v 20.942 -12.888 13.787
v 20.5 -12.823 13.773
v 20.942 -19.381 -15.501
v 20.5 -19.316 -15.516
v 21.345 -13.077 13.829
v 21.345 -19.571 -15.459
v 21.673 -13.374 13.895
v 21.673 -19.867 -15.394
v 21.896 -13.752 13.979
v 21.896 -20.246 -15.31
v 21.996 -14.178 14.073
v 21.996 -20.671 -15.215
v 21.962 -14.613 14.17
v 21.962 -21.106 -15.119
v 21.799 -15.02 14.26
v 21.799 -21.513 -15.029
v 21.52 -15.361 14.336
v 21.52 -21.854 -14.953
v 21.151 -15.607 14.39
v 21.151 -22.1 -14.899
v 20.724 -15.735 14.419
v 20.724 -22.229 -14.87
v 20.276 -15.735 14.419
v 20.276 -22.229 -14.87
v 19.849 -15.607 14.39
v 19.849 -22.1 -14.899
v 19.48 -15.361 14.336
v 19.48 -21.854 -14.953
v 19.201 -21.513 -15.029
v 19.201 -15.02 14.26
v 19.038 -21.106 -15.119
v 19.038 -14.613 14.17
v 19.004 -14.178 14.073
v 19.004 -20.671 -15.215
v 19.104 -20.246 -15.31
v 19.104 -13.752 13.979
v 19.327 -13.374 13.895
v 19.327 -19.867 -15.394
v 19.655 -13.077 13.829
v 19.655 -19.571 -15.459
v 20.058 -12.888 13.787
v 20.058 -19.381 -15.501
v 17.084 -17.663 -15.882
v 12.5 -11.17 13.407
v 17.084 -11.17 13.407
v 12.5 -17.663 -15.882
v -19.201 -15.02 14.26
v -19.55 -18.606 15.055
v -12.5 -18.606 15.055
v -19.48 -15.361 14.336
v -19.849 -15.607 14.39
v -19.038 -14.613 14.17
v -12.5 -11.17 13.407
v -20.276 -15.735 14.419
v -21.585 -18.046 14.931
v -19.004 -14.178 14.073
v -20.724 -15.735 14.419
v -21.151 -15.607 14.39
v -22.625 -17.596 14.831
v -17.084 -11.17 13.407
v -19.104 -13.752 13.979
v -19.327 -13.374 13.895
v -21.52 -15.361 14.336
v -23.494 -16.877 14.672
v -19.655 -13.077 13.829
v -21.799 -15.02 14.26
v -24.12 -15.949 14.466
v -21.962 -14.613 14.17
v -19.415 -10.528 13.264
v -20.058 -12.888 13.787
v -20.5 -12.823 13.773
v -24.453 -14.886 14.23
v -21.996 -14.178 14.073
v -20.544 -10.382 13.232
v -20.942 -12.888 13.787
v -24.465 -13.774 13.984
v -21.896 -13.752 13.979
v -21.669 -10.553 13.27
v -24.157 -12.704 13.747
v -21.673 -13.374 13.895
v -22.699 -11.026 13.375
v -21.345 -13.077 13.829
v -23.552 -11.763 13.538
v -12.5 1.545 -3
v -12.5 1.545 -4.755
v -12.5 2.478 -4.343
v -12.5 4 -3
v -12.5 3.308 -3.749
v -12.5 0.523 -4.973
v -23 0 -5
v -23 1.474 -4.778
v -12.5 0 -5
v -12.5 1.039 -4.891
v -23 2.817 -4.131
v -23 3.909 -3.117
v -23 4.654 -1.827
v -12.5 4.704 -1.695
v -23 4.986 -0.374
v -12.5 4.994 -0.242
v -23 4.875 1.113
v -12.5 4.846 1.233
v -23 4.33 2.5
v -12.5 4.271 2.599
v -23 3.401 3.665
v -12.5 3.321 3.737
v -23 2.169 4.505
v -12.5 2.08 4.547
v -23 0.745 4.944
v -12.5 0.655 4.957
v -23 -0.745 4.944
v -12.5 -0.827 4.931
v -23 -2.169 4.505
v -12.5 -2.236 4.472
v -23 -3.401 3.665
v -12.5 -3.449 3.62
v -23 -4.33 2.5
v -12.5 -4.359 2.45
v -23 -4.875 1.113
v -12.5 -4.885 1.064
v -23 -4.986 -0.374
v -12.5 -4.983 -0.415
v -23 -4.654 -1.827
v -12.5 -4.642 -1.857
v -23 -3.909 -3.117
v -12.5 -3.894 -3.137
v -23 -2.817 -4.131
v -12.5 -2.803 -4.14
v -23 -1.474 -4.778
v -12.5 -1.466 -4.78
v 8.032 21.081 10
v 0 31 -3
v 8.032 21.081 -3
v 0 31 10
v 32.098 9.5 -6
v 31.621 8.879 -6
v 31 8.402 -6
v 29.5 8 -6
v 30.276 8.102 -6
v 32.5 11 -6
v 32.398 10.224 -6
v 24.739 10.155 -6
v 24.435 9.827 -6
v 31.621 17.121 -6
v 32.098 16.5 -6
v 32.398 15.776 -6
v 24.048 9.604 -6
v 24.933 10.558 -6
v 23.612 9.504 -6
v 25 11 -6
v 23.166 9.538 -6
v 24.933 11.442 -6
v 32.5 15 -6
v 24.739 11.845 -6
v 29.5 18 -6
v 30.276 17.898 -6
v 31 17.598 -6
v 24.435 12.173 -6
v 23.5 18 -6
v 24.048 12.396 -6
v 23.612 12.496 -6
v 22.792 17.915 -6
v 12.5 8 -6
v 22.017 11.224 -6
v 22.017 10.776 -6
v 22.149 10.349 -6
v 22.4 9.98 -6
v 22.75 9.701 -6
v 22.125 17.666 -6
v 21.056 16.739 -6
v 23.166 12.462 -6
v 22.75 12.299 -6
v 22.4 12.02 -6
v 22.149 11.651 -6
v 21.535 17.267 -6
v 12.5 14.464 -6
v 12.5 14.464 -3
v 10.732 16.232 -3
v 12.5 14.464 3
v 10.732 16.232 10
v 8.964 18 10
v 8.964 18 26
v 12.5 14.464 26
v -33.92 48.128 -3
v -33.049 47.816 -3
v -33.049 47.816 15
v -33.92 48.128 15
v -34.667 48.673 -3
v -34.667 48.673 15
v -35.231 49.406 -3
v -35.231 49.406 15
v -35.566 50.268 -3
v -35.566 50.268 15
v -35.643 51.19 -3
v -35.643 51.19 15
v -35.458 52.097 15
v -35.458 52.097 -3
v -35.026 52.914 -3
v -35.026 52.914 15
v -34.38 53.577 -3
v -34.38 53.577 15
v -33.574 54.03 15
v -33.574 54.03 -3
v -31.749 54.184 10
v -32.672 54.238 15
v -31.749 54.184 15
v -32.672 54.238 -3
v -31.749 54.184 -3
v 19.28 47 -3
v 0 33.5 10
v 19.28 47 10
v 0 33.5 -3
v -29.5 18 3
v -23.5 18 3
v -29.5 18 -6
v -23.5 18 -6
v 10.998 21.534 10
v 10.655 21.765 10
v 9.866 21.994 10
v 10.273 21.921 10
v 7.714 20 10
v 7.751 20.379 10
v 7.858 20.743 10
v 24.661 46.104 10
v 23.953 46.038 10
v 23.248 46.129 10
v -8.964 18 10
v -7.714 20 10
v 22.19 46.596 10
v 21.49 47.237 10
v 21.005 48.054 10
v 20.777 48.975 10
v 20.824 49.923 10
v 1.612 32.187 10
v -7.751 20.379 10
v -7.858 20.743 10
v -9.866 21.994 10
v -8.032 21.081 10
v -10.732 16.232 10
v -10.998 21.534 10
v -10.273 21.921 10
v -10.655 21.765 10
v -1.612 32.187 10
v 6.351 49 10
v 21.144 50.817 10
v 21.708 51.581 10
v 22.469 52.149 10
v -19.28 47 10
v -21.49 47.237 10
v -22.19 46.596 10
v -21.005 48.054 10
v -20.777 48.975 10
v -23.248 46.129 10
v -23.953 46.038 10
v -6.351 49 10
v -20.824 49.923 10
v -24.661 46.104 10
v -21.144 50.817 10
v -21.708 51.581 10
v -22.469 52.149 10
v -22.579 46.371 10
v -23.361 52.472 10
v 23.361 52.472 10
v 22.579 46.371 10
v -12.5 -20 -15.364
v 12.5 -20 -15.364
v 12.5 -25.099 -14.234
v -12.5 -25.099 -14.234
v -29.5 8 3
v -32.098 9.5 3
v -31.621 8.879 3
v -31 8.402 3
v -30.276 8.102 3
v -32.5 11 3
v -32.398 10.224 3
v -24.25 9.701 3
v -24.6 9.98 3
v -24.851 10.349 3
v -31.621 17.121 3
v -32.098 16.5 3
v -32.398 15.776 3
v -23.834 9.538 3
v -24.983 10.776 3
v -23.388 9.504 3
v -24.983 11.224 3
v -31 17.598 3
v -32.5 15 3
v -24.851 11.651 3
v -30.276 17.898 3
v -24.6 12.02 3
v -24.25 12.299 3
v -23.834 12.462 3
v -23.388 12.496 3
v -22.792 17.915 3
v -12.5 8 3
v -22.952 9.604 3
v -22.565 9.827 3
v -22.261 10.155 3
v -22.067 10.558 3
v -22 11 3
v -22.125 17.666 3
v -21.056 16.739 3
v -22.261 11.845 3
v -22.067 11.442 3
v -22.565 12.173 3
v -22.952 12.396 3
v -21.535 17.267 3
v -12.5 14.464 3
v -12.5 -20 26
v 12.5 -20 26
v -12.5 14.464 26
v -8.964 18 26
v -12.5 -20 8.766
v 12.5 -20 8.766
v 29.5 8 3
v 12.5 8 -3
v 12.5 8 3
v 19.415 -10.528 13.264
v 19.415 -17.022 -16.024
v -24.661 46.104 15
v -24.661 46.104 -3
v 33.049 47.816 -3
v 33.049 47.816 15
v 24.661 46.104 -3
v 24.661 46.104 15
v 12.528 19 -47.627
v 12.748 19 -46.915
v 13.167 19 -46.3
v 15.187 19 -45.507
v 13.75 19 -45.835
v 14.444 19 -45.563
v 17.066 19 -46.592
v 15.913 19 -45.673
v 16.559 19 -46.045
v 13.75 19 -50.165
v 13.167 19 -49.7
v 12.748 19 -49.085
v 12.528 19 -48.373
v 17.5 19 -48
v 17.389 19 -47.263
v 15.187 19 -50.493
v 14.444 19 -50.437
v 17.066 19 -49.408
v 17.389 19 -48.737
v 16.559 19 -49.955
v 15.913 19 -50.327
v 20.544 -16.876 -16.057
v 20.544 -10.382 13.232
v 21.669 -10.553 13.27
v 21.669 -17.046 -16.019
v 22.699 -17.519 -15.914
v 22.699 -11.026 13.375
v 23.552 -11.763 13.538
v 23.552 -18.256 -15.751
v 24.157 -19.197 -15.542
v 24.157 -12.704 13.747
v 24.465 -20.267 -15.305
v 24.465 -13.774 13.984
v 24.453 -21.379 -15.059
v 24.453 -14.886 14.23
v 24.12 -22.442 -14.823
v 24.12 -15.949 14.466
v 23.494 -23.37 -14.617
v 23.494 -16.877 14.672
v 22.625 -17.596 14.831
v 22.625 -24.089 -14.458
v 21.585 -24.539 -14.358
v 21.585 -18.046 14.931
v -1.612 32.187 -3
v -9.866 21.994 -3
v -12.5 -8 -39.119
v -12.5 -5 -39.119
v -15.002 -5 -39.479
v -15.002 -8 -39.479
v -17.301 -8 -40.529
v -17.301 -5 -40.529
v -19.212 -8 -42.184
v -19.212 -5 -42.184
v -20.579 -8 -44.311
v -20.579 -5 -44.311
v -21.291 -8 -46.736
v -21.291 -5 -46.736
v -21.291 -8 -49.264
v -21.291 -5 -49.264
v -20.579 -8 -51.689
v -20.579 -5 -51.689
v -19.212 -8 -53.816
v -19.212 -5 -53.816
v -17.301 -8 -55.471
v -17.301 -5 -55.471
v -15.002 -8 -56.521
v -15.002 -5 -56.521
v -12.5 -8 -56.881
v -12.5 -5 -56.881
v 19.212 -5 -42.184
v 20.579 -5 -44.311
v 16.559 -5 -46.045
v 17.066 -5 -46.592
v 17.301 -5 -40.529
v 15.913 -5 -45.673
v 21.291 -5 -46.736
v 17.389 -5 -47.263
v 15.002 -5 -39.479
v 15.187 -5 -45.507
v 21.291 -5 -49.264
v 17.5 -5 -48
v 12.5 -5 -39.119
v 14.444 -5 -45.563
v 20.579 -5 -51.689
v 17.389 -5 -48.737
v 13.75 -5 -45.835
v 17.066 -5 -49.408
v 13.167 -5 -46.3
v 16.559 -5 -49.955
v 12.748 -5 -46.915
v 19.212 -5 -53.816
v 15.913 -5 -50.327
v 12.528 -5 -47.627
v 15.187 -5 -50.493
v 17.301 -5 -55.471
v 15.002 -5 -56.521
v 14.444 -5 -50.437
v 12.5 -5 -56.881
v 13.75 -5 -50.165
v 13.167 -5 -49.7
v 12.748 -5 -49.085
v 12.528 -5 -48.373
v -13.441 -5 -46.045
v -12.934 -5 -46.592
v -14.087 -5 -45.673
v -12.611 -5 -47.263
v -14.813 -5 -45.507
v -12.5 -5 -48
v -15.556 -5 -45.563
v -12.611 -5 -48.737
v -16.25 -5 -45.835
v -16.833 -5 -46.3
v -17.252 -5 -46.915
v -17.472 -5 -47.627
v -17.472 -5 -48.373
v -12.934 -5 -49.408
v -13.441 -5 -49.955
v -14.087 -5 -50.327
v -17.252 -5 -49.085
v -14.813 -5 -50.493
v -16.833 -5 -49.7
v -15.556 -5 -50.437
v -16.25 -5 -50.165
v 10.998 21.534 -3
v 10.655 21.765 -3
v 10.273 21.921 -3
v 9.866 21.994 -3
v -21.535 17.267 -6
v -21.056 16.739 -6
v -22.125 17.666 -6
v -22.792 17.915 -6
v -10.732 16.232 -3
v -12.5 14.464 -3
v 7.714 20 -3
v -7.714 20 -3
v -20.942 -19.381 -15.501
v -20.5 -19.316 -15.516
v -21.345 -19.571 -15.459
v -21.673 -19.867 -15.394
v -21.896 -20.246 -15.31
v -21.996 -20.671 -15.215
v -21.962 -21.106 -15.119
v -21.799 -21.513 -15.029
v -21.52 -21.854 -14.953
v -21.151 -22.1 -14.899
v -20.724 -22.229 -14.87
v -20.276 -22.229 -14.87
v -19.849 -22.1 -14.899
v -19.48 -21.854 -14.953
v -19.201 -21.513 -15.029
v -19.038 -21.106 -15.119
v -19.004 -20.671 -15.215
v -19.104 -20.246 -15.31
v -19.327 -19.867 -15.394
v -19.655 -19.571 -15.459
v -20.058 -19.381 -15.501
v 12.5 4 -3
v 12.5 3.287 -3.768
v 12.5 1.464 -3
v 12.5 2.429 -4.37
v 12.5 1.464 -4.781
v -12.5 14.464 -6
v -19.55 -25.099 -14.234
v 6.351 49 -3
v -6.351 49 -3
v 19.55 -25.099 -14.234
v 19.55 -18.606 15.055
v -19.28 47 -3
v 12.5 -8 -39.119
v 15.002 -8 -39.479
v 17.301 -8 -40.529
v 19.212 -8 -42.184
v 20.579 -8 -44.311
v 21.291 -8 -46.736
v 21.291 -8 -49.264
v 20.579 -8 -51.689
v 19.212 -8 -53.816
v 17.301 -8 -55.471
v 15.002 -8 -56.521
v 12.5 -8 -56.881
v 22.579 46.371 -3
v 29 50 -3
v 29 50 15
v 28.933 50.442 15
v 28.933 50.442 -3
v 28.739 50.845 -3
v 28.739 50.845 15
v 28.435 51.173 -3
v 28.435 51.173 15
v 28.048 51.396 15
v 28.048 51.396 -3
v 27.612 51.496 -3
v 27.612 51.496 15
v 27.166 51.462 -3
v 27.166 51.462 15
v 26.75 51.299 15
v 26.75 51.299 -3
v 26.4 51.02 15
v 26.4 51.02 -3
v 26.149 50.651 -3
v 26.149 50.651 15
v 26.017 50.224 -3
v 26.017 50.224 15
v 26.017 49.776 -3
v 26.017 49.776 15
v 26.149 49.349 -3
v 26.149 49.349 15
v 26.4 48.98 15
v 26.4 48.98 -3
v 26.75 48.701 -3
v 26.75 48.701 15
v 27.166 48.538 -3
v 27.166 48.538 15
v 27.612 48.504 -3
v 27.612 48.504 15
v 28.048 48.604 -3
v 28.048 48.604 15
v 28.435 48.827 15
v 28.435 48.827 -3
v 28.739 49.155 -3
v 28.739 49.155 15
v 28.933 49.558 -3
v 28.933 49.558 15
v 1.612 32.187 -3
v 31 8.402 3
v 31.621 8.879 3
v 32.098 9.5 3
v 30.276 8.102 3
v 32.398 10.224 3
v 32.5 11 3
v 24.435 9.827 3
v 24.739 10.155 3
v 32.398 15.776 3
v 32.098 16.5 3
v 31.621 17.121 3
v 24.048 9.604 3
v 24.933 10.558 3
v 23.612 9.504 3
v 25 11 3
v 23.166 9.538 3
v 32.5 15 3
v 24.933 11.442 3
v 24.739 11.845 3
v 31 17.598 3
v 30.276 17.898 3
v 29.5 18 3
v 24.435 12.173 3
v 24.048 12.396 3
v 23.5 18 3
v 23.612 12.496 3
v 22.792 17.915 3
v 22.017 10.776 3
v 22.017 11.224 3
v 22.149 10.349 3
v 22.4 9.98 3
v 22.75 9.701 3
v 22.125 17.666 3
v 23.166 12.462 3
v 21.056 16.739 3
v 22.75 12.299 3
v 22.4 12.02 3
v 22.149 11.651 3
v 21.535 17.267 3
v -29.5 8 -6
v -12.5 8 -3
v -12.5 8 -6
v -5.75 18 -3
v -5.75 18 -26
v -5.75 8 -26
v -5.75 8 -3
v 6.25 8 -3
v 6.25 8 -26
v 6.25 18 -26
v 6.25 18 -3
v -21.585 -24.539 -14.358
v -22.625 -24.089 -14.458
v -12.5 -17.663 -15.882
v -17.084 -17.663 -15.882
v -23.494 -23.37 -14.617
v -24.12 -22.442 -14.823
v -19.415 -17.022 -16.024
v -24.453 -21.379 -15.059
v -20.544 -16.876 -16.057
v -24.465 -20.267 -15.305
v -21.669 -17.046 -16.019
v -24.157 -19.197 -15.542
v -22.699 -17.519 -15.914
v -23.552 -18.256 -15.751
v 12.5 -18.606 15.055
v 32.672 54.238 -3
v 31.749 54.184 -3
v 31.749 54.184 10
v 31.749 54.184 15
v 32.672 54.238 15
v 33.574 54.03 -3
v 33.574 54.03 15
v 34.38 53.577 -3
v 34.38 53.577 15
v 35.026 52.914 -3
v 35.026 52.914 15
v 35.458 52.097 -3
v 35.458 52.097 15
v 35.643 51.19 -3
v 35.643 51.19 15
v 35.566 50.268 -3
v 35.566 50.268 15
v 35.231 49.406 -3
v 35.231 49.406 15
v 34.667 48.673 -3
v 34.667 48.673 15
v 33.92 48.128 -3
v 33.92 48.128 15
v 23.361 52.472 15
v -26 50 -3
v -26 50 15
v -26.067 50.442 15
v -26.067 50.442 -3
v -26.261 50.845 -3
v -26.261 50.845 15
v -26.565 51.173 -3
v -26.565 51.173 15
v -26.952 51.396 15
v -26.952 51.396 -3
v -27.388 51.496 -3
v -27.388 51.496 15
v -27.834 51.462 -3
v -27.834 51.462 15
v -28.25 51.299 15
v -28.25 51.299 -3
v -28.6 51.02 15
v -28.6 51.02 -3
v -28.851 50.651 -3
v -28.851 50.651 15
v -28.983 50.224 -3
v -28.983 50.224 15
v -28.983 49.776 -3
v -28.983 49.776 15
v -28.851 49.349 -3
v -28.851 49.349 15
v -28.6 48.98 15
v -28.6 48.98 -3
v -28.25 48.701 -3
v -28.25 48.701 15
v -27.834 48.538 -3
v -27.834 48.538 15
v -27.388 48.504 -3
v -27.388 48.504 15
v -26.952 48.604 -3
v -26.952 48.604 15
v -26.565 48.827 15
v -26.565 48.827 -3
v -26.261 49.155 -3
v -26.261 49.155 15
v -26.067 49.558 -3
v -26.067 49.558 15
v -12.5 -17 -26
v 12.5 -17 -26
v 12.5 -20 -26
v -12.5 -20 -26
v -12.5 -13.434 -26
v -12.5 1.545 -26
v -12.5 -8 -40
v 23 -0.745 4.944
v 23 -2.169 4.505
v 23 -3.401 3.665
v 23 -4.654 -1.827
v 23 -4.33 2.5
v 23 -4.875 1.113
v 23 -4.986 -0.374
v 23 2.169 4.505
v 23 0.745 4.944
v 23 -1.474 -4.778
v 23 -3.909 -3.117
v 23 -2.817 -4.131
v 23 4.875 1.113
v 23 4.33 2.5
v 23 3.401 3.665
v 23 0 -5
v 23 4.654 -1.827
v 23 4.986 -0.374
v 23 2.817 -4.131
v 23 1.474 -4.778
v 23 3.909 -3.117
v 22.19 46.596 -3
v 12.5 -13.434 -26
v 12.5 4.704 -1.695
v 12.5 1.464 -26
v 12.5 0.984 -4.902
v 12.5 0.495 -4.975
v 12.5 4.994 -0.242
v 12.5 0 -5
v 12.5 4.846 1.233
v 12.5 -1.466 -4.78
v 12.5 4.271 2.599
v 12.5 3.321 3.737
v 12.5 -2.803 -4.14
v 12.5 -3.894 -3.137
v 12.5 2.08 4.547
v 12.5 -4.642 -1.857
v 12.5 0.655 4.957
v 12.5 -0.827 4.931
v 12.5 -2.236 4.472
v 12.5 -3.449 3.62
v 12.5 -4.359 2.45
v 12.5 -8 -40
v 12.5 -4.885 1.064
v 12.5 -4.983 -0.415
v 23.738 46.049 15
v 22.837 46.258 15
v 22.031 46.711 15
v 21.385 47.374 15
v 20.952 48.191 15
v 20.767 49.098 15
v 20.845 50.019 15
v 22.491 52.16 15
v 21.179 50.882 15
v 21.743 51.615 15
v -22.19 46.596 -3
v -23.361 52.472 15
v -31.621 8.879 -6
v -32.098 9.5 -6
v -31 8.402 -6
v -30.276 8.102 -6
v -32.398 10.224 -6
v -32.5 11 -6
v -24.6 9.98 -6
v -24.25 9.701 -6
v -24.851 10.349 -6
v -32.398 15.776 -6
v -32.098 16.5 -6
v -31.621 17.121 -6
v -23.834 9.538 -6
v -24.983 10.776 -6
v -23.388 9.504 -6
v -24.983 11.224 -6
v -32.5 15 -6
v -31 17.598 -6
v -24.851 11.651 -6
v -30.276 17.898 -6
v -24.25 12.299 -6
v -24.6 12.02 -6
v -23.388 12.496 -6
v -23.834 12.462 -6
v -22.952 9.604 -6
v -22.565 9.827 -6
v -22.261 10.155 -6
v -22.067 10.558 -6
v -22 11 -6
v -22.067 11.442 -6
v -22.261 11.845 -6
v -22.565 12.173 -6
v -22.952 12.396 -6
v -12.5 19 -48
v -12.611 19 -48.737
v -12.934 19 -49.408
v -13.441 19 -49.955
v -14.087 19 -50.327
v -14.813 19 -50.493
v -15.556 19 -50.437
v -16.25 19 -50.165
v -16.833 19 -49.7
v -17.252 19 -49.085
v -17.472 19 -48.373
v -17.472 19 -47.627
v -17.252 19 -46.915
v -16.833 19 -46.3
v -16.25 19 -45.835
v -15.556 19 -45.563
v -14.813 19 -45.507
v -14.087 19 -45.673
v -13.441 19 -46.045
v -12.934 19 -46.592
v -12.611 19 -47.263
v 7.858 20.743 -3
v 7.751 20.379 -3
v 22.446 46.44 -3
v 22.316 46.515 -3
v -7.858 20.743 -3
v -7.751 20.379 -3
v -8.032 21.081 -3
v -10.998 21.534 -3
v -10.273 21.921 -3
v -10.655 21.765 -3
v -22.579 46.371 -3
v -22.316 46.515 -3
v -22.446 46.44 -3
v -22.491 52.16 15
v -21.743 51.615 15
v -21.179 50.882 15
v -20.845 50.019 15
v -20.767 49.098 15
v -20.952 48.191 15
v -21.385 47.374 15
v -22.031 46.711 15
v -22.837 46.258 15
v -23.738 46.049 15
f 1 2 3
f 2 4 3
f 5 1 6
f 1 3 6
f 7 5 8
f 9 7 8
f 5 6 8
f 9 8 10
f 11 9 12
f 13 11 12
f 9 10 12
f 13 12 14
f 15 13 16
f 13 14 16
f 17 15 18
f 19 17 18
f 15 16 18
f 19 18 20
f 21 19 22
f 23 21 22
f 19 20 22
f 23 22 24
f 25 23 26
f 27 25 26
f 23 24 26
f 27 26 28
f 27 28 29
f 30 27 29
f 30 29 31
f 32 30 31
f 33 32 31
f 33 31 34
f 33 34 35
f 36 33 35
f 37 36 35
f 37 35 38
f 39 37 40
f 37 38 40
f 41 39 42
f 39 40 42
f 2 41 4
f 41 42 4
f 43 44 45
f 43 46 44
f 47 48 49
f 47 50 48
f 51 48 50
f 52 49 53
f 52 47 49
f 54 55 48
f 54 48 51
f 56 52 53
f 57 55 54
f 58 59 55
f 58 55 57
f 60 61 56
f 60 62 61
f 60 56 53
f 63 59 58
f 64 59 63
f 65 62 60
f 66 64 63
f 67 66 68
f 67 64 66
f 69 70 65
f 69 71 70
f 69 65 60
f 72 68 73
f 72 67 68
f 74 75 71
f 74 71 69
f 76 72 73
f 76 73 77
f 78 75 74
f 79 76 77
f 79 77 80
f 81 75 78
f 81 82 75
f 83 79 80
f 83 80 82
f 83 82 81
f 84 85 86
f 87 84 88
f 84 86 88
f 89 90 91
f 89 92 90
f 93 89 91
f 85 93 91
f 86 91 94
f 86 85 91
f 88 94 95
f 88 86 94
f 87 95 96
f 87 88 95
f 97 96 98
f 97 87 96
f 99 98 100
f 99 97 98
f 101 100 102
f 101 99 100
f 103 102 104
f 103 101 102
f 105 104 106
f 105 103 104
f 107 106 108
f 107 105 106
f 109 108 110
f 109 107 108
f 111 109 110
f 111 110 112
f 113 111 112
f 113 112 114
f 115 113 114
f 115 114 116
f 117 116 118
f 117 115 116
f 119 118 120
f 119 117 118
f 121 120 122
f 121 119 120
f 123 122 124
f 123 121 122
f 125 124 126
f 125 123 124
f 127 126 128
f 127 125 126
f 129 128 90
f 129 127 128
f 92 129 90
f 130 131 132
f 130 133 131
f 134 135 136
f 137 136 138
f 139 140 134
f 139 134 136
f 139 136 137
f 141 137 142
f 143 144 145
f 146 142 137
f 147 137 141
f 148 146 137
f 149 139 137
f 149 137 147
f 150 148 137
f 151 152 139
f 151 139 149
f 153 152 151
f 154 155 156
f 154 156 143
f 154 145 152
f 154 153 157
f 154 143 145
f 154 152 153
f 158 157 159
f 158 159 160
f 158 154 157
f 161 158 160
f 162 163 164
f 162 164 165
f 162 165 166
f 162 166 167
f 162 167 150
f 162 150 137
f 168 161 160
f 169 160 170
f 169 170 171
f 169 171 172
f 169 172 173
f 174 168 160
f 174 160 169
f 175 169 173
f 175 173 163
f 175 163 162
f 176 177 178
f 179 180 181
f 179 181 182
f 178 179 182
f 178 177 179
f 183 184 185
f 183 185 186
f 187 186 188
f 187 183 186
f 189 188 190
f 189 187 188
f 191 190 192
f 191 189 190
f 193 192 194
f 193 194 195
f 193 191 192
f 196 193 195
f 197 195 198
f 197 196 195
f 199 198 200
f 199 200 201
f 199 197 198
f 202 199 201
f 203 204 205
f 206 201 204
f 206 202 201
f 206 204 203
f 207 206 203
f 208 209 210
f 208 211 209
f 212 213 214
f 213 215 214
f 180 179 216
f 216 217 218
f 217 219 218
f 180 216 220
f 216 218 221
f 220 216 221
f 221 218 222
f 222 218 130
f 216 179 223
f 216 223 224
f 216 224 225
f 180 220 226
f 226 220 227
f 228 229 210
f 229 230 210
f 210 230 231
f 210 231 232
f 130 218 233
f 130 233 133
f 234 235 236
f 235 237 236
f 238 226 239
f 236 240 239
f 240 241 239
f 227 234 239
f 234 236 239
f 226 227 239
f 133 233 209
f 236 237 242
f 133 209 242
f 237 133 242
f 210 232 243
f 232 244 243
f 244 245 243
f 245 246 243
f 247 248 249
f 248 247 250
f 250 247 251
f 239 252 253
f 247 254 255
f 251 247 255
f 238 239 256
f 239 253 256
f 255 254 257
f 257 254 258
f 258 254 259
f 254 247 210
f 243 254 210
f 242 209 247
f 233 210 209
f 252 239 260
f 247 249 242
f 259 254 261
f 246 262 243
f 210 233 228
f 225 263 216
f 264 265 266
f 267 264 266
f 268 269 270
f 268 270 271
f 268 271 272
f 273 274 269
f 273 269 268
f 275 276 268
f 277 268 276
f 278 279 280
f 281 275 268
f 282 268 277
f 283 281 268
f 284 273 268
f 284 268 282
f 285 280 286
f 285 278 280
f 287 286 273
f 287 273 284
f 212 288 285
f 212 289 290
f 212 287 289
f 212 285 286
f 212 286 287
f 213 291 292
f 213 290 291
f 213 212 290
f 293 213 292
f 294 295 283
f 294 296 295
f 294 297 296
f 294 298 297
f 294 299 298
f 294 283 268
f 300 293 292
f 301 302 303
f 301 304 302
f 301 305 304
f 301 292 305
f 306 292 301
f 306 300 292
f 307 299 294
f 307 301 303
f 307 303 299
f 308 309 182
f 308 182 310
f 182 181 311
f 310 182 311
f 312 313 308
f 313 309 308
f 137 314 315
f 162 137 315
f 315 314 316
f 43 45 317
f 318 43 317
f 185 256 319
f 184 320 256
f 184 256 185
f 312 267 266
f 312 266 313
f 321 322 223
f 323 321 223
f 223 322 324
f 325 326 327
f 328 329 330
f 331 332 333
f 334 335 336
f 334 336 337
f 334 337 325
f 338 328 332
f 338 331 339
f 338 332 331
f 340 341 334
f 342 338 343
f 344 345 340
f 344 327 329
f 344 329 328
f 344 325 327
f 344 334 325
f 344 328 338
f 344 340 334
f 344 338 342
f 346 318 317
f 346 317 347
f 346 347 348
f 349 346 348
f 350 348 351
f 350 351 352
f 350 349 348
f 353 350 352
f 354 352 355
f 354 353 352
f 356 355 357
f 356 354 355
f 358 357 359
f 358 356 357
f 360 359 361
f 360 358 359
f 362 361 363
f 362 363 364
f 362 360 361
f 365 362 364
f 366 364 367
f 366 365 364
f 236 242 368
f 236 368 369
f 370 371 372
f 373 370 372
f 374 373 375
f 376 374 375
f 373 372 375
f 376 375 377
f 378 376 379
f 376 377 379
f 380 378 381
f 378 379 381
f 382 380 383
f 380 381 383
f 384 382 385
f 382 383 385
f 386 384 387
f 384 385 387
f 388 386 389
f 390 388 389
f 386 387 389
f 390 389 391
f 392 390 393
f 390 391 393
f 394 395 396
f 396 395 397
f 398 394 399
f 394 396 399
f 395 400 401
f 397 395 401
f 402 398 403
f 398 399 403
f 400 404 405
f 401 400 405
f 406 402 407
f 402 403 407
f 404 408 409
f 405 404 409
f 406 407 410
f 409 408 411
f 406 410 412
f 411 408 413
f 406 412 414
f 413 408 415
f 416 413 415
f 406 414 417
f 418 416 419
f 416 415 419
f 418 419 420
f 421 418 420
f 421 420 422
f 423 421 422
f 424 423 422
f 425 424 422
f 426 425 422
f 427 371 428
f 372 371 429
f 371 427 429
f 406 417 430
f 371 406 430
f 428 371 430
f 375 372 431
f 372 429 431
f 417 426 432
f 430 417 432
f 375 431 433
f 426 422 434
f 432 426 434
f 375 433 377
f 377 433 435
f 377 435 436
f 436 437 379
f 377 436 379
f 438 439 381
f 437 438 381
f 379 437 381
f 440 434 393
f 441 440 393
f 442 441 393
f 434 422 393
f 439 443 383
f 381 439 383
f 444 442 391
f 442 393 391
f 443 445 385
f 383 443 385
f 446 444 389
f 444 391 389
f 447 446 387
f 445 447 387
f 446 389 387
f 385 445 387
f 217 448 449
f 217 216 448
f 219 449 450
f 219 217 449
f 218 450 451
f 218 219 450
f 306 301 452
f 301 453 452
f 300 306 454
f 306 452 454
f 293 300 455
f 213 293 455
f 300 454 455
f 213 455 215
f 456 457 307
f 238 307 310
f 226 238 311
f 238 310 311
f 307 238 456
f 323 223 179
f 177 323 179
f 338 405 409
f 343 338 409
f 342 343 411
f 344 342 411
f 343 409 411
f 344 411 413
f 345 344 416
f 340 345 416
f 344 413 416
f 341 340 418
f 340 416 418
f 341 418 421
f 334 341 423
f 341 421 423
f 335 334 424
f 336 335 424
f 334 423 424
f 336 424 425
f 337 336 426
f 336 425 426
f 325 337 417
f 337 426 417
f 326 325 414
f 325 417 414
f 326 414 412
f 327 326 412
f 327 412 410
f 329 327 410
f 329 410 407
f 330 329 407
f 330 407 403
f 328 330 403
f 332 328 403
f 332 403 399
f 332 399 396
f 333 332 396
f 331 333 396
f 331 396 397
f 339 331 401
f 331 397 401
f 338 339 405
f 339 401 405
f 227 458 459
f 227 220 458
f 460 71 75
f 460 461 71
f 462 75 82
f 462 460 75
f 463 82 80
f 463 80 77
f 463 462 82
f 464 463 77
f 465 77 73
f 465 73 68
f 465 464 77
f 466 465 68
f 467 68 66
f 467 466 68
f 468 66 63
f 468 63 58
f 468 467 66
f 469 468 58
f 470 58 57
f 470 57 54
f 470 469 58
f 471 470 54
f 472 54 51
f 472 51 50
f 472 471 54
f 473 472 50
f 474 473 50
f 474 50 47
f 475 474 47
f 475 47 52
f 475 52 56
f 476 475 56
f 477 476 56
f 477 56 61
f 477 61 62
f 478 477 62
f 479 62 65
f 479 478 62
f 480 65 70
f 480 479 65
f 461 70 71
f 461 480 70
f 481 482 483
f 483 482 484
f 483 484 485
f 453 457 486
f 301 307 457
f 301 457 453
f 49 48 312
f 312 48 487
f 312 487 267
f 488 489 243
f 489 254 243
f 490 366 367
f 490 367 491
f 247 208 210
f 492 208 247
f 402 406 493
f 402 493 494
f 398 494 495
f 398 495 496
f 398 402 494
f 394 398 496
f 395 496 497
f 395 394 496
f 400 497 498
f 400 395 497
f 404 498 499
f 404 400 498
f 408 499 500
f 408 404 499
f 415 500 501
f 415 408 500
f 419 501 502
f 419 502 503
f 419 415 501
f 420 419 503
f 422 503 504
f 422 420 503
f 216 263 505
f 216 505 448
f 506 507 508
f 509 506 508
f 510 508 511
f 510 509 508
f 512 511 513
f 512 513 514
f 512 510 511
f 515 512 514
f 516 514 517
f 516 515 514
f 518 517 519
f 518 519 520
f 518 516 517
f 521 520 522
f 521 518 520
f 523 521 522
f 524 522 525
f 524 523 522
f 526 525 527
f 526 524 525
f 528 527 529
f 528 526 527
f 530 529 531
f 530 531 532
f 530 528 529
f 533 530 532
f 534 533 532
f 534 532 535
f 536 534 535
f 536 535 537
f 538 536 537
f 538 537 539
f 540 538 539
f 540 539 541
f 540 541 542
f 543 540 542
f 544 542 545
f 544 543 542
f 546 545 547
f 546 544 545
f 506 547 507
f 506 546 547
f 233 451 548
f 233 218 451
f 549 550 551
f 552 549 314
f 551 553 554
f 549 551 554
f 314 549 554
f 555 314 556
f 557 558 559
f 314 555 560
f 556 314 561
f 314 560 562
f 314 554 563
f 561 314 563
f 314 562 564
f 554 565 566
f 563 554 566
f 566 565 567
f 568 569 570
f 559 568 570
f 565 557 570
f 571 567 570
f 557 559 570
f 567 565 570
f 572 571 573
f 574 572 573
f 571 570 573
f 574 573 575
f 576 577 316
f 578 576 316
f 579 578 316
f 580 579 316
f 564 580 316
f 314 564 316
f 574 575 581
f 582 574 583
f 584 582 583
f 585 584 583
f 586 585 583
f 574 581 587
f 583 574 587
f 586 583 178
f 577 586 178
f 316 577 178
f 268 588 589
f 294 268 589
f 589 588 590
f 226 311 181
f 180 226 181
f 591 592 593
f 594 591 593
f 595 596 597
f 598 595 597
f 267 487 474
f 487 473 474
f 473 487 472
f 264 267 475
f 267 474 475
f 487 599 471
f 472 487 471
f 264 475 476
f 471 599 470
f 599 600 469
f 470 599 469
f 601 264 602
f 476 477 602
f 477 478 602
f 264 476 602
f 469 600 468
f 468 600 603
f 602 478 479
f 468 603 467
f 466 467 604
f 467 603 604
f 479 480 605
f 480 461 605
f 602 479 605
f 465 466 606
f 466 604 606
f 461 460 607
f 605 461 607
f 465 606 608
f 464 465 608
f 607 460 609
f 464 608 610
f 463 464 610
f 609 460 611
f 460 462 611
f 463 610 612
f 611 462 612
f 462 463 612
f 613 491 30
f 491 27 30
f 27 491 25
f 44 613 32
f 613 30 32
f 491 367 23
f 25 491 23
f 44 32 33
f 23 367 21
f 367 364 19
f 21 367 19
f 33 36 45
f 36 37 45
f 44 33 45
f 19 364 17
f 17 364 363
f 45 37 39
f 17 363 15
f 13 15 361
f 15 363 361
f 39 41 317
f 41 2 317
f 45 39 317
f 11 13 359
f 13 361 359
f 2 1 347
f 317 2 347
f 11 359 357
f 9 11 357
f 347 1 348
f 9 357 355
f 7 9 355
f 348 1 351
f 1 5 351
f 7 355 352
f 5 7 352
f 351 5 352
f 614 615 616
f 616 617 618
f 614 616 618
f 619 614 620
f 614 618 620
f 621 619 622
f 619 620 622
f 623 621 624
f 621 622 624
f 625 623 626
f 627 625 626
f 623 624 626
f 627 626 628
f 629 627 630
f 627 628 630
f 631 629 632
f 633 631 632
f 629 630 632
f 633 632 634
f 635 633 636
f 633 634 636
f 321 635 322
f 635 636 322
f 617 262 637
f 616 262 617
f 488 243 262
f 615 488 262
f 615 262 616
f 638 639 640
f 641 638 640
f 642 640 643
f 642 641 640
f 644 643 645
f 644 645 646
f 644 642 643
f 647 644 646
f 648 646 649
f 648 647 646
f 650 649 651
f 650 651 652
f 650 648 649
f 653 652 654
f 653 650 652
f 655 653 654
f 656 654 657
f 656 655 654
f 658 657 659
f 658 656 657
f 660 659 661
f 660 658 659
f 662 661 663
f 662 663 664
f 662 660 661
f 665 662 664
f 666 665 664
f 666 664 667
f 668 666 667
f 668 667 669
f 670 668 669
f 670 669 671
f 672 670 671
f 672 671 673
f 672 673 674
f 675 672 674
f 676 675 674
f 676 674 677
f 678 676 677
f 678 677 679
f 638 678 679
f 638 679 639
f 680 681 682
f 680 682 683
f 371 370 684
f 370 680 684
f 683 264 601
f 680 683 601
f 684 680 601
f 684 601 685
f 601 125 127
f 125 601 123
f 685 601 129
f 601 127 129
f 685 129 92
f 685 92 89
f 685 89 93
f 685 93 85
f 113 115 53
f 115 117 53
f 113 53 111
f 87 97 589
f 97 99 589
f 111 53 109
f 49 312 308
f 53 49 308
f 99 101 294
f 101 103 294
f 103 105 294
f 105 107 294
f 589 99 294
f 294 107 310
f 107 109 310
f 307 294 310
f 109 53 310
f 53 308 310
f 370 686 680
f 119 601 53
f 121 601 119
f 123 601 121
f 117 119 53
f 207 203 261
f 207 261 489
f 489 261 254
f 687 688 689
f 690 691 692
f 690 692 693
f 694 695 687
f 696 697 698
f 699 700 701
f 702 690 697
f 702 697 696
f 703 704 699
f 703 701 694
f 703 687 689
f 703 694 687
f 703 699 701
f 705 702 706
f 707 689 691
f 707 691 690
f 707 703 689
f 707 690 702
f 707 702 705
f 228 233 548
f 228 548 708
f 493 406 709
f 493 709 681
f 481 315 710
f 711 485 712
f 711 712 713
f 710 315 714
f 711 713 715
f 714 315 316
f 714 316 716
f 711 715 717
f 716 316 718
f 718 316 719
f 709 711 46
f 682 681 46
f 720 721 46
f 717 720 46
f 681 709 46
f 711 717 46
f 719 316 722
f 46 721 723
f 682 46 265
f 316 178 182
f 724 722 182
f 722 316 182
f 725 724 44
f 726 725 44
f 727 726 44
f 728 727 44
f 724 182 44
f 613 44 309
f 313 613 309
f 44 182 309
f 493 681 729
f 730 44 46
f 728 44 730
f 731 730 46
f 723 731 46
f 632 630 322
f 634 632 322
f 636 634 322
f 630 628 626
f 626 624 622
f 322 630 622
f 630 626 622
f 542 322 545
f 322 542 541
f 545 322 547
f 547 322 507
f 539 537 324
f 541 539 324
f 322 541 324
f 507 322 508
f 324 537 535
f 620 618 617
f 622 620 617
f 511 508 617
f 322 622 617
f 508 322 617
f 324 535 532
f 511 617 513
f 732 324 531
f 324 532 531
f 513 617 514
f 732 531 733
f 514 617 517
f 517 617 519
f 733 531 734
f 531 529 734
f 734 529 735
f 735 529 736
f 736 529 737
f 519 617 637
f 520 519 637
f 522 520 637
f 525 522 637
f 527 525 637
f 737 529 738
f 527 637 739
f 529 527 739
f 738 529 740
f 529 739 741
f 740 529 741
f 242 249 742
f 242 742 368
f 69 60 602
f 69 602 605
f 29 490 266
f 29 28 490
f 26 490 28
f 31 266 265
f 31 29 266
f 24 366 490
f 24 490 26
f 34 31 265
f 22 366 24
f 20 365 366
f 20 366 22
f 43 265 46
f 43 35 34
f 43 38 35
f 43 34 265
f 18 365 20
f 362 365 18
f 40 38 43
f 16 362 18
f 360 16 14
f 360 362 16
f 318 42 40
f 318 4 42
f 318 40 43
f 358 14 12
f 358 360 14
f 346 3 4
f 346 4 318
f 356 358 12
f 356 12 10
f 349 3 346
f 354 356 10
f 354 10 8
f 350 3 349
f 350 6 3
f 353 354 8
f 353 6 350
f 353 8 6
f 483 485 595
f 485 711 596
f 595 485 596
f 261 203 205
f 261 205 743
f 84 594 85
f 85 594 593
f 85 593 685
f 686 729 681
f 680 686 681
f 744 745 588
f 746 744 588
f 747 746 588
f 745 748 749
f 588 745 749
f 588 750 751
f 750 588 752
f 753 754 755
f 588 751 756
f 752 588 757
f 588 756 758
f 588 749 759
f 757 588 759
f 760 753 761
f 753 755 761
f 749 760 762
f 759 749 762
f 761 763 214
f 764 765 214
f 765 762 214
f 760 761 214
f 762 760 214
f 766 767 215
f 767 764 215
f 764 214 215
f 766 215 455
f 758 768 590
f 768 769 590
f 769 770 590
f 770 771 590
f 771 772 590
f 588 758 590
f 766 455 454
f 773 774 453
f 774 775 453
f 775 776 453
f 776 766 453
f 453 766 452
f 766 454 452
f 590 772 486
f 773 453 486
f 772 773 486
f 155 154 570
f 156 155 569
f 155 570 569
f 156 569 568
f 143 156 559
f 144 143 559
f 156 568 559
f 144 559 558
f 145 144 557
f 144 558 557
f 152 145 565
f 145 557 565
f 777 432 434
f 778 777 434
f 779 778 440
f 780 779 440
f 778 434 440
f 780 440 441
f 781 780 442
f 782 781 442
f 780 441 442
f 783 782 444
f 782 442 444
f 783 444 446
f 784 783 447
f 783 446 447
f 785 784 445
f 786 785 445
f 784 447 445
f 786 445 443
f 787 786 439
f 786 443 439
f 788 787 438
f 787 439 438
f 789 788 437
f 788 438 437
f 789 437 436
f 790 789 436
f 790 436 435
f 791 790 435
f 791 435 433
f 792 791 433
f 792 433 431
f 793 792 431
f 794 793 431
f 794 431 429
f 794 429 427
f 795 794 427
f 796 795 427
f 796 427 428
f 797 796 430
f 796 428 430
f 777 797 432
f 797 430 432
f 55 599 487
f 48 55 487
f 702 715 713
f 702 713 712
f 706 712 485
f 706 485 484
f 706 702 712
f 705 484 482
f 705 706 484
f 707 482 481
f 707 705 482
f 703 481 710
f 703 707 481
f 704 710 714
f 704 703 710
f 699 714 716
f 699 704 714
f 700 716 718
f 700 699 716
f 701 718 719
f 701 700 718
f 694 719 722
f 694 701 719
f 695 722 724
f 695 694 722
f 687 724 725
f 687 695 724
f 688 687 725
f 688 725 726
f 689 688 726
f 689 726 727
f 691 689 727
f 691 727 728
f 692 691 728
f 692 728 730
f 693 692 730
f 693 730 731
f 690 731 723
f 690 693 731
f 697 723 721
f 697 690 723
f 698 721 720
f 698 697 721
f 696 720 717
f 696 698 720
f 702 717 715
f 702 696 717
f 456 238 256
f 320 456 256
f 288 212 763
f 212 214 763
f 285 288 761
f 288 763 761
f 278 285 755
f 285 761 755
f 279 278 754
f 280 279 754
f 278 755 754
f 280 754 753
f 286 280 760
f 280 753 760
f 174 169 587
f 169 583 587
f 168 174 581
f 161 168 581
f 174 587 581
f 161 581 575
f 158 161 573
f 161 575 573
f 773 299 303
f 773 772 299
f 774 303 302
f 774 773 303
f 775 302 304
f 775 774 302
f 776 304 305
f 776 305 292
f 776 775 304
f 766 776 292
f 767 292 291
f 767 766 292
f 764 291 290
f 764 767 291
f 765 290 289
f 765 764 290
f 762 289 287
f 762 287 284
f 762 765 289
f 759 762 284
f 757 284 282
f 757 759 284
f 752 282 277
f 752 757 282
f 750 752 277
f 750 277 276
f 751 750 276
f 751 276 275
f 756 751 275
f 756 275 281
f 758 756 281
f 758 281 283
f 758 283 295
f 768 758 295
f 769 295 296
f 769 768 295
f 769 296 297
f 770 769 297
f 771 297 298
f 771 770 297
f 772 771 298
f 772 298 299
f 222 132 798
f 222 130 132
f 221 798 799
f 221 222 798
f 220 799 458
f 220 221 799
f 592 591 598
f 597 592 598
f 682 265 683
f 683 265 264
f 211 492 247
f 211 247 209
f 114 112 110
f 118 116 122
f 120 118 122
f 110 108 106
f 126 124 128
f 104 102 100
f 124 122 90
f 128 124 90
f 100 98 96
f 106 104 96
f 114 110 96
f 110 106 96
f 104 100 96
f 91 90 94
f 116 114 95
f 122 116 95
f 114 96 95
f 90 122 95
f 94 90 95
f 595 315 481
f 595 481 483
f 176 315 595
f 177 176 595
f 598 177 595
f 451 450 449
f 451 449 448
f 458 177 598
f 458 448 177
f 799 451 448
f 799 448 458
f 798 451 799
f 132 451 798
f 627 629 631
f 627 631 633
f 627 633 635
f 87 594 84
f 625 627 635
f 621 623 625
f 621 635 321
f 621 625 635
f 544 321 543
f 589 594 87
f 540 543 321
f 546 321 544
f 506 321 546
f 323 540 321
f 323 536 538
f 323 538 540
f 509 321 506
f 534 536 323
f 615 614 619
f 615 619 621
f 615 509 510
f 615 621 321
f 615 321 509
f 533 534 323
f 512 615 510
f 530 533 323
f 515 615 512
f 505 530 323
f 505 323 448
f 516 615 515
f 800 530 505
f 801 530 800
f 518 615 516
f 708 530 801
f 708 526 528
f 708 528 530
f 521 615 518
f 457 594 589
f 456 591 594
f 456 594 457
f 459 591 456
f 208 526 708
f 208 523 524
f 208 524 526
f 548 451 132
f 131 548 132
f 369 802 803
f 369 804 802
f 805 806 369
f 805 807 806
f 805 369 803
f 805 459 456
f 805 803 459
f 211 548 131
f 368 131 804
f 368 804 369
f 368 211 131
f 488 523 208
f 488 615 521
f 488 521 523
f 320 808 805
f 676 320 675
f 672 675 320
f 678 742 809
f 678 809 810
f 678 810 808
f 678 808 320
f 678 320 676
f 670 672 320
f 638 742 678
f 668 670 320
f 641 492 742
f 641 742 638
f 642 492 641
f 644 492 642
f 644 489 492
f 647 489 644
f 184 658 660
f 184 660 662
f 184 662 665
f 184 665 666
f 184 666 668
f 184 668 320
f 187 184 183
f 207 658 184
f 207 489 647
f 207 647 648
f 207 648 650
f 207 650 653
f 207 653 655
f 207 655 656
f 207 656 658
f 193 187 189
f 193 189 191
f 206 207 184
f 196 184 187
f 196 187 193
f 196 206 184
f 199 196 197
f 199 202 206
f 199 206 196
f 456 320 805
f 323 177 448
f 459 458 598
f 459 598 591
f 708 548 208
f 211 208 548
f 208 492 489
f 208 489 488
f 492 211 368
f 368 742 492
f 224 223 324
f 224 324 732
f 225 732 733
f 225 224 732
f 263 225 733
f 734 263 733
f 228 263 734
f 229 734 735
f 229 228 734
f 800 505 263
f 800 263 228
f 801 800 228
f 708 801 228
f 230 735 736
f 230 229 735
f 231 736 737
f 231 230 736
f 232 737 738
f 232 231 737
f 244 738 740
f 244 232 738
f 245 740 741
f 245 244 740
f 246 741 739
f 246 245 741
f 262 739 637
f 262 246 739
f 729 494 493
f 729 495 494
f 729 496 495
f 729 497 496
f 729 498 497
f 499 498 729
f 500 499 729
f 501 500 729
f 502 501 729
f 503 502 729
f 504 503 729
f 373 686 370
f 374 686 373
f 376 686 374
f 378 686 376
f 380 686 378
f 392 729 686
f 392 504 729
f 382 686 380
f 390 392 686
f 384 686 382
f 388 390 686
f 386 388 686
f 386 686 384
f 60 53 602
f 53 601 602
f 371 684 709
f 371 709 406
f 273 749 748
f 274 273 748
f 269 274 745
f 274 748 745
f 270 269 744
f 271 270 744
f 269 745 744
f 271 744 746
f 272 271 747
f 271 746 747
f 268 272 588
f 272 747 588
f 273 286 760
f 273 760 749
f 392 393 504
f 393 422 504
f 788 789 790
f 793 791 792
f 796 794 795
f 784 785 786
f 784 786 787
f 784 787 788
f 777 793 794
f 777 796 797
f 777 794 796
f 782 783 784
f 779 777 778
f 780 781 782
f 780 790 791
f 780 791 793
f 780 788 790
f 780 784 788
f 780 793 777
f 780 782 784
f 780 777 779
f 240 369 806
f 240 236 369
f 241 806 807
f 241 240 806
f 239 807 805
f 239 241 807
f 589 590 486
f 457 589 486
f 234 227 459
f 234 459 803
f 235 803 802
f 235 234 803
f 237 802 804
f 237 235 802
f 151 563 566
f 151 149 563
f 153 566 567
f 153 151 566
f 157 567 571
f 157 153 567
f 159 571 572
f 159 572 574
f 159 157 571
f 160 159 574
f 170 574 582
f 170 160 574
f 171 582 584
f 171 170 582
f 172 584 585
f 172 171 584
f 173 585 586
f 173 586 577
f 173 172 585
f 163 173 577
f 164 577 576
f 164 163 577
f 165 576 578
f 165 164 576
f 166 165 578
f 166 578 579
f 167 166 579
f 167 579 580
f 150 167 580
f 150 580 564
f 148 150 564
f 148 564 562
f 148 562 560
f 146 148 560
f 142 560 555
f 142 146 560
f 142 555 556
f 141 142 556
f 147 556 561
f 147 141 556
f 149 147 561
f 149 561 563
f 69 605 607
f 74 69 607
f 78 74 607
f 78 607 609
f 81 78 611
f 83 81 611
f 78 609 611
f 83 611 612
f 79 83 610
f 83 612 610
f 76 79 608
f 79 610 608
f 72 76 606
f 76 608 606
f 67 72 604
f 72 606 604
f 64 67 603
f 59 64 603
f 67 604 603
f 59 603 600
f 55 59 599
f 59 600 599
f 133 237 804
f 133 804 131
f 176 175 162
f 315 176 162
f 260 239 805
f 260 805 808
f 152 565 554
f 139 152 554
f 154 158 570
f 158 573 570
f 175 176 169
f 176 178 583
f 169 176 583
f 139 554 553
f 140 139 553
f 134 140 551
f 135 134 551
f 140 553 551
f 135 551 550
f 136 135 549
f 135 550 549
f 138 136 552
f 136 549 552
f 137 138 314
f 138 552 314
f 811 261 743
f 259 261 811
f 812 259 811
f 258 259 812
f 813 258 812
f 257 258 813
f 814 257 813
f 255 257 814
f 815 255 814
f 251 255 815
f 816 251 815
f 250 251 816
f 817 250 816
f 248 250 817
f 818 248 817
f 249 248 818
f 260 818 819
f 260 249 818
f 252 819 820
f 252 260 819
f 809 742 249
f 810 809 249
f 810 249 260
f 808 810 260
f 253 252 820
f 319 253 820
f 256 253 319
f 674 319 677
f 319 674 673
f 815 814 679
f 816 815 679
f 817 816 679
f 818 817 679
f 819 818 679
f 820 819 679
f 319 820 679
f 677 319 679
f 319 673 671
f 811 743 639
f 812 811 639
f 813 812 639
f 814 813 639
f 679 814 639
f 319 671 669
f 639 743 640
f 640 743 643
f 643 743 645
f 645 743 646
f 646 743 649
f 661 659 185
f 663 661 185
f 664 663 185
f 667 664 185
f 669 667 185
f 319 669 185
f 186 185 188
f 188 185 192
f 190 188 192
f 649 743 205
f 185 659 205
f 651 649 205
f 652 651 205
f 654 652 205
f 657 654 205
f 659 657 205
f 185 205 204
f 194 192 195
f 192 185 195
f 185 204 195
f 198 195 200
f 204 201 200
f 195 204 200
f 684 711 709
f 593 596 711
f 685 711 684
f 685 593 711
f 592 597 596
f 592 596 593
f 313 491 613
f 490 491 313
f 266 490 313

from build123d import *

# Parameters (mm, degrees)
SKETCH1_R                    = 5
DRIVELINE_AXIS_DEPTH         = 23
DUMMY_BOSS_DEPTH             = 26
SKETCH8_R                    = 1.5
UPRIGHTS_DEPTH               = 10
UPRIGHTS_DEPTH_BACK          = 3
SKETCH9_R                    = 1.5
SHOCK_MOUNT_DEPTH            = 5
SHOCK_MOUNT_DEPTH_BACK       = 13
SKETCH10_R                   = 1.5
TURNBUCKLE_MOUNTS_DEPTH      = 3
TURNBUCKLE_MOUNTS_DEPTH_BACK = 6
TURNBUCKLE_ROOM_DEPTH        = 1
TURNBUCKLE_ROOM_DEPTH_BACK   = 23
BOSS_EXTRUDE2_DEPTH          = 12.5
BOSS_EXTRUDE3_DEPTH          = 3
SKETCH43_R                   = 2.5
BOSS_EXTRUDE4_DEPTH          = 24
BOSS_EXTRUDE5_DEPTH          = 15
BOSS_EXTRUDE6_DEPTH          = 12.5
SKETCH49_R                   = 1.5
CUT_EXTRUDE1_DEPTH           = 15


with BuildPart() as part:
    # Sketch1 → Driveline Axis (new body, symmetric)
    with BuildSketch(Plane(origin=(0, 0, 0), x_dir=(0, 0, -1), z_dir=(1, 0, 0))):
        Circle(SKETCH1_R)
    extrude(amount=DRIVELINE_AXIS_DEPTH, both=True)

    # Sketch2 → Dummy Boss (add, symmetric)
    with BuildSketch(Plane.XY):
        Polygon((-12.5, -20), (-12.5, 14.464466094), (-8.964466094, 18), (8.964466094, 18), (12.5, 14.464466094), (12.5, -20), align=None)
    extrude(amount=DUMMY_BOSS_DEPTH, both=True)

    # Sketch8 → Uprights (add, two sides)
    with BuildSketch(Plane.XY) as uprights_sk:
        with BuildLine():
            Line((-10.732233047, 16.232233047), (-24.661465898, 46.103569293))
            Line((-24.661465898, 46.103569293), (-33.048979486, 47.815663334))
            ThreePointArc((-33.048979486, 47.815663334), (-35.583316151, 51.65), (-31.748979486, 54.184336666))
            Line((-31.748979486, 54.184336666), (-6.351020514, 49))
            Line((-6.351020514, 49), (6.351020514, 49))
            Line((6.351020514, 49), (31.748979486, 54.184336666))
            ThreePointArc((31.748979486, 54.184336666), (35.583316151, 51.65), (33.048979486, 47.815663334))
            Line((33.048979486, 47.815663334), (24.661465898, 46.103569293))
            Line((24.661465898, 46.103569293), (10.732233047, 16.232233047))
            Line((10.732233047, 16.232233047), (8.964466094, 18))
            Line((8.964466094, 18), (-8.964466094, 18))
            Line((-8.964466094, 18), (-10.732233047, 16.232233047))
        make_face()
        with Locations((-27.5, 50)):
            Circle(SKETCH8_R, mode=Mode.SUBTRACT)
        with Locations((27.5, 50)):
            Circle(SKETCH8_R, mode=Mode.SUBTRACT)
        with BuildLine():
            Line((9.866245938, 21.994232403), (1.612099151, 32.1872548))
            Line((1.612099151, 32.1872548), (22.924030195, 47.110029571))
            Line((22.924030195, 47.110029571), (10.997739753, 21.534017182))
            ThreePointArc((10.997739753, 21.534017182), (10.467987263, 21.852621345), (9.866245938, 21.994232403))
        make_face(mode=Mode.SUBTRACT)
        with BuildLine():
            Line((7.714466094, 20), (-7.714466094, 20))
            ThreePointArc((-7.714466094, 20), (-7.795487149, 20.563488959), (-8.031985901, 21.081323449))
            Line((-8.031985901, 21.081323449), (0, 31))
            Line((0, 31), (8.031985901, 21.081323449))
            ThreePointArc((8.031985901, 21.081323449), (7.795487149, 20.563488959), (7.714466094, 20))
        make_face(mode=Mode.SUBTRACT)
        with BuildLine():
            Line((-10.997739753, 21.534017182), (-22.924030195, 47.110029571))
            Line((-22.924030195, 47.110029571), (-1.612099151, 32.1872548))
            Line((-1.612099151, 32.1872548), (-9.866245938, 21.994232403))
            ThreePointArc((-9.866245938, 21.994232403), (-10.467987263, 21.852621345), (-10.997739753, 21.534017182))
        make_face(mode=Mode.SUBTRACT)
        Polygon((-19.279998091, 47), (0, 33.5), (19.279998091, 47), align=None, mode=Mode.SUBTRACT)
    extrude(amount=UPRIGHTS_DEPTH)
    extrude(uprights_sk.sketch, amount=-UPRIGHTS_DEPTH_BACK)

    # Sketch9 → Shock Mount (add, two sides)
    with BuildSketch(Plane.XY.offset(10)) as shock_mount_sk:
        with BuildLine():
            Line((-24.661465898, 46.103569293), (-33.048979486, 47.815663334))
            ThreePointArc((-33.048979486, 47.815663334), (-35.583316151, 51.65), (-31.748979486, 54.184336666))
            Line((-31.748979486, 54.184336666), (-23.361465898, 52.472242624))
            ThreePointArc((-23.361465898, 52.472242624), (-20.827129232, 48.637905958), (-24.661465898, 46.103569293))
        make_face()
        with Locations((-27.5, 50)):
            Circle(SKETCH9_R, mode=Mode.SUBTRACT)
        with BuildLine():
            Line((23.361465898, 52.472242624), (31.748979486, 54.184336666))
            ThreePointArc((31.748979486, 54.184336666), (35.583316151, 51.65), (33.048979486, 47.815663334))
            Line((33.048979486, 47.815663334), (24.661465898, 46.103569293))
            ThreePointArc((24.661465898, 46.103569293), (20.827129232, 48.637905958), (23.361465898, 52.472242624))
        make_face()
        with Locations((27.5, 50)):
            Circle(SKETCH9_R, mode=Mode.SUBTRACT)
    extrude(amount=SHOCK_MOUNT_DEPTH)
    extrude(shock_mount_sk.sketch, amount=-SHOCK_MOUNT_DEPTH_BACK)

    # Sketch10 → Turnbuckle Mounts (add, two sides)
    with BuildSketch(Plane.XY) as turnbuckle_mounts_sk:
        with BuildLine():
            Line((29.5, 8), (12.5, 8))
            Line((12.5, 8), (12.5, 14.464466094))
            Line((12.5, 14.464466094), (21.055616084, 16.739249053))
            ThreePointArc((21.055616084, 16.739249053), (22.124817677, 17.666247097), (23.5, 18))
            Line((23.5, 18), (29.5, 18))
            ThreePointArc((29.5, 18), (31.621320344, 17.121320344), (32.5, 15))
            Line((32.5, 15), (32.5, 11))
            ThreePointArc((32.5, 11), (31.621320344, 8.878679656), (29.5, 8))
        make_face()
        with Locations((23.5, 11)):
            Circle(SKETCH10_R, mode=Mode.SUBTRACT)
        with BuildLine():
            Line((-12.5, 14.464466094), (-21.055616084, 16.739249053))
            ThreePointArc((-21.055616084, 16.739249053), (-22.124817677, 17.666247097), (-23.5, 18))
            Line((-23.5, 18), (-29.5, 18))
            ThreePointArc((-29.5, 18), (-31.621320344, 17.121320344), (-32.5, 15))
            Line((-32.5, 15), (-32.5, 11))
            ThreePointArc((-32.5, 11), (-31.621320344, 8.878679656), (-29.5, 8))
            Line((-29.5, 8), (-12.5, 8))
            Line((-12.5, 8), (-12.5, 14.464466094))
        make_face()
        with Locations((-23.5, 11)):
            Circle(SKETCH10_R, mode=Mode.SUBTRACT)
    extrude(amount=TURNBUCKLE_MOUNTS_DEPTH)
    extrude(turnbuckle_mounts_sk.sketch, amount=-TURNBUCKLE_MOUNTS_DEPTH_BACK)

    # Sketch11 → Turnbuckle Room (cut, two sides)
    with BuildSketch(Plane(origin=(0, 0, -26), x_dir=(-1, 0, 0), z_dir=(0, 0, -1))) as turnbuckle_room_sk:
        Polygon((8.964466094, 18), (5.75, 18), (5.75, 8), (12.5, 1.544903812), (12.5, 14.464466094), align=None)
        Polygon((-12.5, 14.464466094), (-12.5, 1.464466094), (-6.25, 8), (-6.25, 18), (-8.964466094, 18), align=None)
    extrude(amount=TURNBUCKLE_ROOM_DEPTH, mode=Mode.SUBTRACT)
    extrude(turnbuckle_room_sk.sketch, amount=-TURNBUCKLE_ROOM_DEPTH_BACK, mode=Mode.SUBTRACT)

    # Sketch40 → Boss-Extrude2 (add, symmetric)
    with BuildSketch(Plane(origin=(0, 0, 0), x_dir=(0, 0, -1), z_dir=(1, 0, 0))):
        Polygon((26, -13.433574933), (39.118894341, -5), (56.881105659, -5), (56.881105659, -8), (40, -8), (26, -17), align=None)
    extrude(amount=BOSS_EXTRUDE2_DEPTH, both=True)

    # Sketch41 → Boss-Extrude3 (add)
    with BuildSketch(Plane(origin=(0, -5, 0), x_dir=(1, 0, 0), z_dir=(0, 1, 0))):
        with BuildLine():
            Line((12.5, 56.881105659), (12.5, 39.118894341))
            ThreePointArc((12.5, 39.118894341), (21.381105659, 48), (12.5, 56.881105659))
        make_face()
    boss_extrude3 = extrude(amount=-BOSS_EXTRUDE3_DEPTH)

    # Mirror4: Boss-Extrude3 across plane
    add(boss_extrude3.mirror(Plane(origin=(0, 0, 0), x_dir=(0, 0, 1), z_dir=(1, 0, 0))))

    # Sketch43 → Boss-Extrude4 (add)
    with BuildSketch(Plane(origin=(0, -5, 0), x_dir=(1, 0, 0), z_dir=(0, 1, 0))):
        with Locations((-15, 48)):
            Circle(SKETCH43_R)
        with Locations((15, 48)):
            Circle(SKETCH43_R)
    extrude(amount=BOSS_EXTRUDE4_DEPTH)

    # Sketch47 → Boss-Extrude5 (add, symmetric)
    with BuildSketch(Plane(origin=(0, -0.93692213, -4.226182617), x_dir=(0, 0.976296007, -0.216439614), z_dir=(0, -0.216439614, -0.976296007))):
        with BuildLine():
            Line((-13.806627078, 12.5), (-13.806627078, 17.084049145))
            Line((-13.806627078, 17.084049145), (-13.149862777, 19.41536026))
            ThreePointArc((-13.149862777, 19.41536026), (-15.91536026, 24.350137223), (-20.850137223, 21.58463974))
            Line((-20.850137223, 21.58463974), (-21.423285097, 19.550141201))
            Line((-21.423285097, 19.550141201), (-21.423285097, 12.5))
            Line((-21.423285097, 12.5), (-13.806627078, 12.5))
        make_face()
    boss_extrude5 = extrude(amount=BOSS_EXTRUDE5_DEPTH, both=True)

    # Sketch48 → Boss-Extrude6 (add)
    with BuildSketch(Plane.ZY.offset(-12.5)):
        Polygon((-14.233775168, -25.098984039), (8.766255495, -20), (-15.364192715, -20), align=None)
    boss_extrude6 = extrude(amount=BOSS_EXTRUDE6_DEPTH)

    # Sketch49 → Cut-Extrude1 (cut, symmetric)
    with BuildSketch(Plane(origin=(0, -0.93692213, -4.226182617), x_dir=(0, 0.976296007, -0.216439614), z_dir=(0, -0.216439614, -0.976296007))):
        with Locations((-17, 20.5)):
            Circle(SKETCH49_R)
    cut_extrude1 = extrude(amount=CUT_EXTRUDE1_DEPTH, both=True, mode=Mode.SUBTRACT)

    # Mirror5: Boss-Extrude5, Boss-Extrude6, Cut-Extrude1 across plane
    add(boss_extrude5.mirror(Plane(origin=(0, 0, 0), x_dir=(0, 0, 1), z_dir=(1, 0, 0))))
    add(boss_extrude6.mirror(Plane(origin=(0, 0, 0), x_dir=(0, 0, 1), z_dir=(1, 0, 0))))
    add(cut_extrude1.mirror(Plane(origin=(0, 0, 0), x_dir=(0, 0, 1), z_dir=(1, 0, 0))), mode=Mode.SUBTRACT)


solid = part.part
